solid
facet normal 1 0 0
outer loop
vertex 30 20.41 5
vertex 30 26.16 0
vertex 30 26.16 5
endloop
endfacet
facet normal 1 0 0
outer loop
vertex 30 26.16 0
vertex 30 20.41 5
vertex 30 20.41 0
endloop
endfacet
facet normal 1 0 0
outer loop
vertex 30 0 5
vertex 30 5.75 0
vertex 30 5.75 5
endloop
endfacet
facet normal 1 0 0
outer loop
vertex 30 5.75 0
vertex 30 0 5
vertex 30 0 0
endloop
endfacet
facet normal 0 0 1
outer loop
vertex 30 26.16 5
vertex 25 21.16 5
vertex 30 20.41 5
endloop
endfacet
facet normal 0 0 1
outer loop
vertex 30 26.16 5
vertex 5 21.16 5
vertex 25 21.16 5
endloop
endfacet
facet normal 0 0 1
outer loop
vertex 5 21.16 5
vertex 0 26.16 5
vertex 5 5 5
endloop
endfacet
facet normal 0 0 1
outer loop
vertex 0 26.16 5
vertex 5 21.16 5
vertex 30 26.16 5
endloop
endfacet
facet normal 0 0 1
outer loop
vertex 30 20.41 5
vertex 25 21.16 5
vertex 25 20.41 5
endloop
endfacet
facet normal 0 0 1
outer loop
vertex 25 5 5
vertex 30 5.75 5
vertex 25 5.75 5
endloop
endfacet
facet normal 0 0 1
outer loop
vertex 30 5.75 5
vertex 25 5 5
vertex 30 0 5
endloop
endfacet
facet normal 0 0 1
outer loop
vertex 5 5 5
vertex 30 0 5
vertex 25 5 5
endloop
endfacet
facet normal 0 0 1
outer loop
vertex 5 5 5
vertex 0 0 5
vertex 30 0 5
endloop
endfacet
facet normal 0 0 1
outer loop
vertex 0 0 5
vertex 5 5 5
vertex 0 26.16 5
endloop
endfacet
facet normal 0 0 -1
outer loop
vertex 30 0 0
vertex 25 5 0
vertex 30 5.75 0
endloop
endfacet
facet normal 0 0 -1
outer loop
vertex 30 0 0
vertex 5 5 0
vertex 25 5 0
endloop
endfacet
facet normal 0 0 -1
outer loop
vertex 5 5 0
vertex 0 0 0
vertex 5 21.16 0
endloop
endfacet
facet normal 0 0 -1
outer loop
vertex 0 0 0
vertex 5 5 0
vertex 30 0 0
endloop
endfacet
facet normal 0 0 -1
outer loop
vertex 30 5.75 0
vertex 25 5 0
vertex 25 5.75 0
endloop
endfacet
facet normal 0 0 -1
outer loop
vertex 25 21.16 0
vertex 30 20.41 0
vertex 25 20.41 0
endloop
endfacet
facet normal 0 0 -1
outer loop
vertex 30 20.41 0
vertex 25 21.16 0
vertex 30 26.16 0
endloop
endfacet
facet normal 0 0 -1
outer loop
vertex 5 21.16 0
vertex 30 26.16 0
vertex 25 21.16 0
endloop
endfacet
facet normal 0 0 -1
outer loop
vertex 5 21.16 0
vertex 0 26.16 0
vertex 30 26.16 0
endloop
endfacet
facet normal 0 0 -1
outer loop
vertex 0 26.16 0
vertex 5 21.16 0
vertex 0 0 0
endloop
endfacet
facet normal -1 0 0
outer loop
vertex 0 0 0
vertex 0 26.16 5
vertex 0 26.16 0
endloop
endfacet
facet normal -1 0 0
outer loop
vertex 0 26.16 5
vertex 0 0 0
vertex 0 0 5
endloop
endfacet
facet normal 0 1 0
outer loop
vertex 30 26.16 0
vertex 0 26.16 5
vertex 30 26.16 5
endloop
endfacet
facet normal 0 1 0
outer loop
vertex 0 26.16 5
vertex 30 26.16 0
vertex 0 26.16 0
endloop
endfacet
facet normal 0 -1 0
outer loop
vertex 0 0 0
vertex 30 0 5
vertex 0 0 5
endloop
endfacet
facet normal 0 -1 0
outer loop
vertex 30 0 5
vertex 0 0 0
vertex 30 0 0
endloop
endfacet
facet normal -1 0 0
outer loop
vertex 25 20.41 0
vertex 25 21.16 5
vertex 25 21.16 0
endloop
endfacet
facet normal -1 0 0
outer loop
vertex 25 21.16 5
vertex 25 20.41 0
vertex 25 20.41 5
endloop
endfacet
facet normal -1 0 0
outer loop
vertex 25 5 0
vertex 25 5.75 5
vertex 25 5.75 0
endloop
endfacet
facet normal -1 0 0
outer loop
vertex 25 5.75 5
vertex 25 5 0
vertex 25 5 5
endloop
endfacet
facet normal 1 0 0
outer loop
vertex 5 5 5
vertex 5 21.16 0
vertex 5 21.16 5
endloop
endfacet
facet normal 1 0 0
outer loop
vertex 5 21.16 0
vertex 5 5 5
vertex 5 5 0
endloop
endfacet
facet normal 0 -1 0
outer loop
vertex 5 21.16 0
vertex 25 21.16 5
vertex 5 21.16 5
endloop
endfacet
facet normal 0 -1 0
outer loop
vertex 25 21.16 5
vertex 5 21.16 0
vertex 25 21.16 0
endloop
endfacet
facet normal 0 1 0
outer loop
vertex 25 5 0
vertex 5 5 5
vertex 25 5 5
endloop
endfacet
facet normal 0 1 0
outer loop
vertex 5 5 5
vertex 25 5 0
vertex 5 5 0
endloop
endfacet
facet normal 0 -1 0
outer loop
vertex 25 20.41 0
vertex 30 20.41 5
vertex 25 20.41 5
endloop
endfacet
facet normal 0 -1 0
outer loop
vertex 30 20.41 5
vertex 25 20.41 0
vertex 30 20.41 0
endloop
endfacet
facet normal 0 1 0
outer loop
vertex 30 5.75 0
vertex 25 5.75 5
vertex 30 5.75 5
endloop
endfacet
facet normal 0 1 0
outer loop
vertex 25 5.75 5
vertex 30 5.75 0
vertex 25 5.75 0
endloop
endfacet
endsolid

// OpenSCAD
// Jeff's Simple Parametric Clip (SPC)
//
// Free Software for a Voluntary World
//
// Google "voluntaryism"
//
// Thanks and enjoy!
//
// #####################################################################
//
// #####################################################################
//
// This is free and unencumbered software released into the public domain.
// 
// Anyone is free to copy, modify, publish, use, compile, sell, or
// distribute this software, either in source code form or as a compiled
// binary, for any purpose, commercial or non-commercial, and by any
// means.
// 
// In jurisdictions that recognize copyright laws, the author or authors
// of this software dedicate any and all copyright interest in the
// software to the public domain. We make this dedication for the benefit
// of the public at large and to the detriment of our heirs and
// successors. We intend this dedication to be an overt act of
// relinquishment in perpetuity of all present and future rights to this
// software under copyright law.
// 
// THE SOFTWARE IS PROVIDED "AS IS", WITHOUT WARRANTY OF ANY KIND,
// EXPRESS OR IMPLIED, INCLUDING BUT NOT LIMITED TO THE WARRANTIES OF
// MERCHANTABILITY, FITNESS FOR A PARTICULAR PURPOSE AND NONINFRINGEMENT.
// IN NO EVENT SHALL THE AUTHORS BE LIABLE FOR ANY CLAIM, DAMAGES OR
// OTHER LIABILITY, WHETHER IN AN ACTION OF CONTRACT, TORT OR OTHERWISE,
// ARISING FROM, OUT OF OR IN CONNECTION WITH THE SOFTWARE OR THE USE OR
// OTHER DEALINGS IN THE SOFTWARE.
// 
// For more information, please refer to <http://unlicense.org/>


// Configurable Values
jaw_depth     = 20;
jaw_thickness = 5;
jaw_spacing   = 16.16;
tooth_height  = .75;

// The Object
module jeffs_spc() {


  // Calculated Values
  body_length = jaw_depth + (jaw_thickness * 2);
  body_width  = jaw_spacing + (jaw_thickness * 2);

  mouth_width = jaw_spacing - (tooth_height * 2);
  mouth_x_pos = jaw_depth + jaw_thickness;
  mouth_y_pos = jaw_thickness + tooth_height;

  difference() {

    // Jaw Body
    cube([body_length, body_width, jaw_thickness]);
  
  
    // Jaw Center Hole
    translate([jaw_thickness, jaw_thickness, -1])
    cube([jaw_depth, jaw_spacing, jaw_thickness + 2]);
  
  
    // Mouth
    translate([mouth_x_pos - 1, mouth_y_pos, -1])
    cube([jaw_thickness + 2, mouth_width, jaw_thickness + 2]);
  }
}

jeffs_spc();
